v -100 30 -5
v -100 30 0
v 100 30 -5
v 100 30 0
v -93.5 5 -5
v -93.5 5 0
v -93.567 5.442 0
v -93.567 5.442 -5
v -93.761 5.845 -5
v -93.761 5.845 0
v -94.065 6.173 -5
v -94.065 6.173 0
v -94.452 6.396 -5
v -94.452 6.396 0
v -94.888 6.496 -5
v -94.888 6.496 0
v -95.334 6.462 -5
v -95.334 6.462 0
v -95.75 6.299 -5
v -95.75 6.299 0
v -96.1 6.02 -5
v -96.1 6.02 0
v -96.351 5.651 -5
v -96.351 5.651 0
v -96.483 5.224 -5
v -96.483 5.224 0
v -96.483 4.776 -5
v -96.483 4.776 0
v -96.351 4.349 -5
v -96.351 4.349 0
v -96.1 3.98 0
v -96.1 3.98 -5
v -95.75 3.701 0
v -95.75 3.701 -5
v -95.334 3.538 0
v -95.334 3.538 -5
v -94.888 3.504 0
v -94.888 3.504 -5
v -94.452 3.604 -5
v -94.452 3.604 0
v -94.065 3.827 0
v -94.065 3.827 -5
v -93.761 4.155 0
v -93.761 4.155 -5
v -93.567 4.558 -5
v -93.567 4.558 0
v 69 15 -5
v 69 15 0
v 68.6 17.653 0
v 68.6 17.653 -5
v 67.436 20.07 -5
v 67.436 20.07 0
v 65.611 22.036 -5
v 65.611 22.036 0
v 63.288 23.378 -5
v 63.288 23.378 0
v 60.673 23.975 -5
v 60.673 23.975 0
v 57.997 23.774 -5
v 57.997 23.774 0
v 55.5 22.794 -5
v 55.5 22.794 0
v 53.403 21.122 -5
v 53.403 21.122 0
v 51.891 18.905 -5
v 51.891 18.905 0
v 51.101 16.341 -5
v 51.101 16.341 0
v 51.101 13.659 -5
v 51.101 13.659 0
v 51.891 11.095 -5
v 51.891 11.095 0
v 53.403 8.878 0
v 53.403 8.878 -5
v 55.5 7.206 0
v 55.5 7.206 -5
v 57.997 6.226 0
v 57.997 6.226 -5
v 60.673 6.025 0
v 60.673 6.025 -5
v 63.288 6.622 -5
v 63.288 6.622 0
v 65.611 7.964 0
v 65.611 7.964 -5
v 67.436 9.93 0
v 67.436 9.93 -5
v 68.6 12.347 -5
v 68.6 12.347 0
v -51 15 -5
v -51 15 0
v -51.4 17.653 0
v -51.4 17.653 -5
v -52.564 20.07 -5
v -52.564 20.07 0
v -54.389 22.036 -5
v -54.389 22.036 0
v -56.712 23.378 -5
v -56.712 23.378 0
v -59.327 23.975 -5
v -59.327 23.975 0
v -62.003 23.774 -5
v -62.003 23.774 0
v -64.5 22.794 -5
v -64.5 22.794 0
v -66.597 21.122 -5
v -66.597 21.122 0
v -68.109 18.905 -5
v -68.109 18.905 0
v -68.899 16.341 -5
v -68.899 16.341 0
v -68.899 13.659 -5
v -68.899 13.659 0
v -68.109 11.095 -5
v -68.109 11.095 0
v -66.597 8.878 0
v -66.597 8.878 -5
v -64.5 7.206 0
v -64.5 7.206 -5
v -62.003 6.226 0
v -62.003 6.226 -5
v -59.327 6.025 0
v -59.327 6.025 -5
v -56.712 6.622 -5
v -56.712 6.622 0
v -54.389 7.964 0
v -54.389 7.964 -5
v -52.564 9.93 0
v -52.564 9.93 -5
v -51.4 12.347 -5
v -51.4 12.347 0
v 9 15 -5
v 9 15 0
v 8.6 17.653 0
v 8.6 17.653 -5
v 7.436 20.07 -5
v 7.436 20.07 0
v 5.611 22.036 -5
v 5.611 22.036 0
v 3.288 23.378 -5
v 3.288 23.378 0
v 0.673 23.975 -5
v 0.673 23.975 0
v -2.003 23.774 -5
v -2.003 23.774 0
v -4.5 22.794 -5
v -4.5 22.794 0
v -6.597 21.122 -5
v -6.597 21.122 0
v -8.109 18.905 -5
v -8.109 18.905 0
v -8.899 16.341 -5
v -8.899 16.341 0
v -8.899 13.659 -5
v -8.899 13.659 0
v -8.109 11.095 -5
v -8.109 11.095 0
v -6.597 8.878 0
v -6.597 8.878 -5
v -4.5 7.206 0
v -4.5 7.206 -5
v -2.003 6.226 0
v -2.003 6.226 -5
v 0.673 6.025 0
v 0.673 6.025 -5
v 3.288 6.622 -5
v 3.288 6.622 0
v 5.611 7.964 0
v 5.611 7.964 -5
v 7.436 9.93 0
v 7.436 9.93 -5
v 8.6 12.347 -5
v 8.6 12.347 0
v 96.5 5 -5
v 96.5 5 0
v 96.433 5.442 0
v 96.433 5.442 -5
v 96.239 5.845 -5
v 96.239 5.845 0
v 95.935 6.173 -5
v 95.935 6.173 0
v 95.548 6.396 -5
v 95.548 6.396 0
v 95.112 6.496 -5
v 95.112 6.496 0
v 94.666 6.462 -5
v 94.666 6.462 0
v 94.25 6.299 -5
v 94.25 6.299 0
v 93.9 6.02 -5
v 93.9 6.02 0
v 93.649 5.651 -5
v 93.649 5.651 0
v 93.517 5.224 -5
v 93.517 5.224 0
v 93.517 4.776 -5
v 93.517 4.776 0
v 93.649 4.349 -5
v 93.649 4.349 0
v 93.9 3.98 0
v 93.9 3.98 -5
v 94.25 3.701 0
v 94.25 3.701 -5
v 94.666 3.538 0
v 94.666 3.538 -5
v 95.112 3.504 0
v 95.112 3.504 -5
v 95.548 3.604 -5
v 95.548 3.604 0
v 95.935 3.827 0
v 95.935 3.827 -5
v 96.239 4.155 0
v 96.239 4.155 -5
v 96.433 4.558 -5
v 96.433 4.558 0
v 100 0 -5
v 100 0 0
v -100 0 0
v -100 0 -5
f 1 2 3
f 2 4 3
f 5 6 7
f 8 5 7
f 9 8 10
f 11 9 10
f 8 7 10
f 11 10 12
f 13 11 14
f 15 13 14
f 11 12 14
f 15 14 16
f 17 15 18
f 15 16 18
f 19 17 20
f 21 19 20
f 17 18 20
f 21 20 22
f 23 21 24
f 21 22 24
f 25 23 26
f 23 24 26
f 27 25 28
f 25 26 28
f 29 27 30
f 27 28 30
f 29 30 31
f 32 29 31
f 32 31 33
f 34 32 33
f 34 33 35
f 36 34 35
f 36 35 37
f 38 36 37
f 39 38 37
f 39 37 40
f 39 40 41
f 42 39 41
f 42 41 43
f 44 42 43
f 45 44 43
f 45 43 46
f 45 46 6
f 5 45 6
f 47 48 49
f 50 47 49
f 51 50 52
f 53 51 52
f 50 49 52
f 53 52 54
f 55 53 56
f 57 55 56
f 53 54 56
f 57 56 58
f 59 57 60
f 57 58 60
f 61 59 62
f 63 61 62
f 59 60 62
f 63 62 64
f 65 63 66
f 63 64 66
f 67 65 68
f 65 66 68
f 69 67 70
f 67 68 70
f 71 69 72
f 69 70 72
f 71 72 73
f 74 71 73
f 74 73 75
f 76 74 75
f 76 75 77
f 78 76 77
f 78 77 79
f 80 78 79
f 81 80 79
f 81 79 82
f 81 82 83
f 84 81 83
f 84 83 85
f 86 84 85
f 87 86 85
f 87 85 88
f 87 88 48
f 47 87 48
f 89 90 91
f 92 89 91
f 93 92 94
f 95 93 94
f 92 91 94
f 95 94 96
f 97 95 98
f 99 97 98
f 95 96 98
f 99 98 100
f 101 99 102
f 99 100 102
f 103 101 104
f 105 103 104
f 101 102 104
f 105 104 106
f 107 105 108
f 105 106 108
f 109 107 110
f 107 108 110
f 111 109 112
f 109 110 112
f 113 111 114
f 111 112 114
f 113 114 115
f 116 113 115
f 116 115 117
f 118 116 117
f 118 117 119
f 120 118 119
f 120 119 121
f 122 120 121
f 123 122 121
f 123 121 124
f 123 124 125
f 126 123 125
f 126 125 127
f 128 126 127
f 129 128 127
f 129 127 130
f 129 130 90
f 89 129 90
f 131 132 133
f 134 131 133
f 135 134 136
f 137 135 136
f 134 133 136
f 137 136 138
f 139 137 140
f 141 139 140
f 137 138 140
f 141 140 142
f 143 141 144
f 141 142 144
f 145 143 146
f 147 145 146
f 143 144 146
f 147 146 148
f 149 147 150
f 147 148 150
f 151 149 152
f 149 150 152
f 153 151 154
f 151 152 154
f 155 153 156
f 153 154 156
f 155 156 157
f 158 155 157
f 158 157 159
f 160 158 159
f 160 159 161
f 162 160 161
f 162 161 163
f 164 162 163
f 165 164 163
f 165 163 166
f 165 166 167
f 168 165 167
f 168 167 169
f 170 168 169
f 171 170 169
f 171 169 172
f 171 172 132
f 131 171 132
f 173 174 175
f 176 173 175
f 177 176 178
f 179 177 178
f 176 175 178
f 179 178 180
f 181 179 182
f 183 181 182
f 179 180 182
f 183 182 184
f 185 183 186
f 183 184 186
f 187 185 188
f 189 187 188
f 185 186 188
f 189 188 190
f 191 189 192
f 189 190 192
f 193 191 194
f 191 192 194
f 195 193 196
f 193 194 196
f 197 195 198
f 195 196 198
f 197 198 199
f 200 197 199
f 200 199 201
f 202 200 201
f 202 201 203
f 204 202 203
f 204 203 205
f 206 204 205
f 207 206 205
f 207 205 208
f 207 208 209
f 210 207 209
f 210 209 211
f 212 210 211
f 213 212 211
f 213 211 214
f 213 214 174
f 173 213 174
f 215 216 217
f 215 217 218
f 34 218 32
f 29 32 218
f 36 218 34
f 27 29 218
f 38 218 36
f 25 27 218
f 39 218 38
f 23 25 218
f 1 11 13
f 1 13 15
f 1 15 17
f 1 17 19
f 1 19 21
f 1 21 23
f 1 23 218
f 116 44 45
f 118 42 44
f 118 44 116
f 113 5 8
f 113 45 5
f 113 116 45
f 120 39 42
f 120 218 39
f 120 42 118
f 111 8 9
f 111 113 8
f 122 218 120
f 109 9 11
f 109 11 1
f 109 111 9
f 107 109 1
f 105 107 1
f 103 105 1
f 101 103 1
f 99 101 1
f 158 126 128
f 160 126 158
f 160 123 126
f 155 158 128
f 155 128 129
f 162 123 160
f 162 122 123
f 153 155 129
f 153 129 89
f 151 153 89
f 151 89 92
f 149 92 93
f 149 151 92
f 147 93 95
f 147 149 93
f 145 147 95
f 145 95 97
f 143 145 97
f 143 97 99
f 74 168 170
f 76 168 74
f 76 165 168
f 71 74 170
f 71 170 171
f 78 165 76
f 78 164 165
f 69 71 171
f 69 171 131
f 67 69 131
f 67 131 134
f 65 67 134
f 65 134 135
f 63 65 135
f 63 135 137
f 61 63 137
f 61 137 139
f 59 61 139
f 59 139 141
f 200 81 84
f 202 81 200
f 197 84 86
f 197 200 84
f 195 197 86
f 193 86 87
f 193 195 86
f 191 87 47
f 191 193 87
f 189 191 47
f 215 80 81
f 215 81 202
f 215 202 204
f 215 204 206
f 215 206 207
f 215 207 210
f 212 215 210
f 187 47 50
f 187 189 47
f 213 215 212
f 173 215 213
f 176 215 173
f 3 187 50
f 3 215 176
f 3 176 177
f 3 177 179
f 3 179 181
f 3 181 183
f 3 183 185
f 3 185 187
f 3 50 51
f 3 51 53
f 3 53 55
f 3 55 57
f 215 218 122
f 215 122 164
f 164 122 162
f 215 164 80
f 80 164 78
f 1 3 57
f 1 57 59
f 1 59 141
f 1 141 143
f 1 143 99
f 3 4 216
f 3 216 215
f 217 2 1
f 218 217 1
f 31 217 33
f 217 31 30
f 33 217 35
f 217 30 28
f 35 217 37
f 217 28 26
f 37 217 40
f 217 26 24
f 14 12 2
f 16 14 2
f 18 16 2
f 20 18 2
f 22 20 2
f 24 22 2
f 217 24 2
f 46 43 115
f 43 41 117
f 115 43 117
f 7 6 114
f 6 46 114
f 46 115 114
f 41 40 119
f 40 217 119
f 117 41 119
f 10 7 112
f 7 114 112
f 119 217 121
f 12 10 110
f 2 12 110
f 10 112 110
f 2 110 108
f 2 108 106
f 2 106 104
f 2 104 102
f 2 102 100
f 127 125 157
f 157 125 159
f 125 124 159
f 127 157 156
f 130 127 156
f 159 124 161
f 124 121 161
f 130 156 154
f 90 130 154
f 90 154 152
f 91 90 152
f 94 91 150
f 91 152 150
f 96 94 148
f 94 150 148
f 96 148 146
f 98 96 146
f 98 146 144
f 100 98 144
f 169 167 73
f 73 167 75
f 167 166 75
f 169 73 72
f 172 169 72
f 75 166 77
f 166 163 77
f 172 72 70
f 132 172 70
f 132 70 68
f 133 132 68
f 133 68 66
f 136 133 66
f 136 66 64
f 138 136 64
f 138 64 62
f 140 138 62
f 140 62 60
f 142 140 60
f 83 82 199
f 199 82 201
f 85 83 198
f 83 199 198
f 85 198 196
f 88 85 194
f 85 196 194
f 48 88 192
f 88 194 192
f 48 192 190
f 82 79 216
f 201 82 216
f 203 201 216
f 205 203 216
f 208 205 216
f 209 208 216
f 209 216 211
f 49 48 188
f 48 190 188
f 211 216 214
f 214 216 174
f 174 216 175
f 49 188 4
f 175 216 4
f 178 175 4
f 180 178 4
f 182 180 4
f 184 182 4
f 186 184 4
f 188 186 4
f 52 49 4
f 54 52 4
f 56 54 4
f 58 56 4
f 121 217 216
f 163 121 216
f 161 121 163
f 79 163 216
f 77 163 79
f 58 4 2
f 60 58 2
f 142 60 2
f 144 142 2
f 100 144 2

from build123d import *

# Parameters (mm, degrees)
SKETCH1_W           = 5
SKETCH1_H           = 30
BOSS_EXTRUDE1_DEPTH = 100
SKETCH4_R           = 9
SKETCH4_R_2         = 1.5
CUT_EXTRUDE2_DEPTH  = 10


with BuildPart() as part:
    # Sketch1 → Boss-Extrude1 (new, symmetric)
    with BuildSketch(Plane(origin=(0, 0, 0), x_dir=(0, 0, -1), z_dir=(1, 0, 0))):
        with Locations((2.5, 15)):
            Rectangle(SKETCH1_W, SKETCH1_H)
    extrude(amount=BOSS_EXTRUDE1_DEPTH, both=True)

    # Sketch4 → Cut-Extrude2 (cut)
    with BuildSketch(Plane.XY):
        with Locations((0, 15)):
            Circle(SKETCH4_R)
        with Locations((60, 15)):
            Circle(SKETCH4_R)
        with Locations((-60, 15)):
            Circle(SKETCH4_R)
        with Locations((-95, 5)):
            Circle(SKETCH4_R_2)
        with Locations((95, 5)):
            Circle(SKETCH4_R_2)
    extrude(amount=-CUT_EXTRUDE2_DEPTH, mode=Mode.SUBTRACT)


solid = part.part
